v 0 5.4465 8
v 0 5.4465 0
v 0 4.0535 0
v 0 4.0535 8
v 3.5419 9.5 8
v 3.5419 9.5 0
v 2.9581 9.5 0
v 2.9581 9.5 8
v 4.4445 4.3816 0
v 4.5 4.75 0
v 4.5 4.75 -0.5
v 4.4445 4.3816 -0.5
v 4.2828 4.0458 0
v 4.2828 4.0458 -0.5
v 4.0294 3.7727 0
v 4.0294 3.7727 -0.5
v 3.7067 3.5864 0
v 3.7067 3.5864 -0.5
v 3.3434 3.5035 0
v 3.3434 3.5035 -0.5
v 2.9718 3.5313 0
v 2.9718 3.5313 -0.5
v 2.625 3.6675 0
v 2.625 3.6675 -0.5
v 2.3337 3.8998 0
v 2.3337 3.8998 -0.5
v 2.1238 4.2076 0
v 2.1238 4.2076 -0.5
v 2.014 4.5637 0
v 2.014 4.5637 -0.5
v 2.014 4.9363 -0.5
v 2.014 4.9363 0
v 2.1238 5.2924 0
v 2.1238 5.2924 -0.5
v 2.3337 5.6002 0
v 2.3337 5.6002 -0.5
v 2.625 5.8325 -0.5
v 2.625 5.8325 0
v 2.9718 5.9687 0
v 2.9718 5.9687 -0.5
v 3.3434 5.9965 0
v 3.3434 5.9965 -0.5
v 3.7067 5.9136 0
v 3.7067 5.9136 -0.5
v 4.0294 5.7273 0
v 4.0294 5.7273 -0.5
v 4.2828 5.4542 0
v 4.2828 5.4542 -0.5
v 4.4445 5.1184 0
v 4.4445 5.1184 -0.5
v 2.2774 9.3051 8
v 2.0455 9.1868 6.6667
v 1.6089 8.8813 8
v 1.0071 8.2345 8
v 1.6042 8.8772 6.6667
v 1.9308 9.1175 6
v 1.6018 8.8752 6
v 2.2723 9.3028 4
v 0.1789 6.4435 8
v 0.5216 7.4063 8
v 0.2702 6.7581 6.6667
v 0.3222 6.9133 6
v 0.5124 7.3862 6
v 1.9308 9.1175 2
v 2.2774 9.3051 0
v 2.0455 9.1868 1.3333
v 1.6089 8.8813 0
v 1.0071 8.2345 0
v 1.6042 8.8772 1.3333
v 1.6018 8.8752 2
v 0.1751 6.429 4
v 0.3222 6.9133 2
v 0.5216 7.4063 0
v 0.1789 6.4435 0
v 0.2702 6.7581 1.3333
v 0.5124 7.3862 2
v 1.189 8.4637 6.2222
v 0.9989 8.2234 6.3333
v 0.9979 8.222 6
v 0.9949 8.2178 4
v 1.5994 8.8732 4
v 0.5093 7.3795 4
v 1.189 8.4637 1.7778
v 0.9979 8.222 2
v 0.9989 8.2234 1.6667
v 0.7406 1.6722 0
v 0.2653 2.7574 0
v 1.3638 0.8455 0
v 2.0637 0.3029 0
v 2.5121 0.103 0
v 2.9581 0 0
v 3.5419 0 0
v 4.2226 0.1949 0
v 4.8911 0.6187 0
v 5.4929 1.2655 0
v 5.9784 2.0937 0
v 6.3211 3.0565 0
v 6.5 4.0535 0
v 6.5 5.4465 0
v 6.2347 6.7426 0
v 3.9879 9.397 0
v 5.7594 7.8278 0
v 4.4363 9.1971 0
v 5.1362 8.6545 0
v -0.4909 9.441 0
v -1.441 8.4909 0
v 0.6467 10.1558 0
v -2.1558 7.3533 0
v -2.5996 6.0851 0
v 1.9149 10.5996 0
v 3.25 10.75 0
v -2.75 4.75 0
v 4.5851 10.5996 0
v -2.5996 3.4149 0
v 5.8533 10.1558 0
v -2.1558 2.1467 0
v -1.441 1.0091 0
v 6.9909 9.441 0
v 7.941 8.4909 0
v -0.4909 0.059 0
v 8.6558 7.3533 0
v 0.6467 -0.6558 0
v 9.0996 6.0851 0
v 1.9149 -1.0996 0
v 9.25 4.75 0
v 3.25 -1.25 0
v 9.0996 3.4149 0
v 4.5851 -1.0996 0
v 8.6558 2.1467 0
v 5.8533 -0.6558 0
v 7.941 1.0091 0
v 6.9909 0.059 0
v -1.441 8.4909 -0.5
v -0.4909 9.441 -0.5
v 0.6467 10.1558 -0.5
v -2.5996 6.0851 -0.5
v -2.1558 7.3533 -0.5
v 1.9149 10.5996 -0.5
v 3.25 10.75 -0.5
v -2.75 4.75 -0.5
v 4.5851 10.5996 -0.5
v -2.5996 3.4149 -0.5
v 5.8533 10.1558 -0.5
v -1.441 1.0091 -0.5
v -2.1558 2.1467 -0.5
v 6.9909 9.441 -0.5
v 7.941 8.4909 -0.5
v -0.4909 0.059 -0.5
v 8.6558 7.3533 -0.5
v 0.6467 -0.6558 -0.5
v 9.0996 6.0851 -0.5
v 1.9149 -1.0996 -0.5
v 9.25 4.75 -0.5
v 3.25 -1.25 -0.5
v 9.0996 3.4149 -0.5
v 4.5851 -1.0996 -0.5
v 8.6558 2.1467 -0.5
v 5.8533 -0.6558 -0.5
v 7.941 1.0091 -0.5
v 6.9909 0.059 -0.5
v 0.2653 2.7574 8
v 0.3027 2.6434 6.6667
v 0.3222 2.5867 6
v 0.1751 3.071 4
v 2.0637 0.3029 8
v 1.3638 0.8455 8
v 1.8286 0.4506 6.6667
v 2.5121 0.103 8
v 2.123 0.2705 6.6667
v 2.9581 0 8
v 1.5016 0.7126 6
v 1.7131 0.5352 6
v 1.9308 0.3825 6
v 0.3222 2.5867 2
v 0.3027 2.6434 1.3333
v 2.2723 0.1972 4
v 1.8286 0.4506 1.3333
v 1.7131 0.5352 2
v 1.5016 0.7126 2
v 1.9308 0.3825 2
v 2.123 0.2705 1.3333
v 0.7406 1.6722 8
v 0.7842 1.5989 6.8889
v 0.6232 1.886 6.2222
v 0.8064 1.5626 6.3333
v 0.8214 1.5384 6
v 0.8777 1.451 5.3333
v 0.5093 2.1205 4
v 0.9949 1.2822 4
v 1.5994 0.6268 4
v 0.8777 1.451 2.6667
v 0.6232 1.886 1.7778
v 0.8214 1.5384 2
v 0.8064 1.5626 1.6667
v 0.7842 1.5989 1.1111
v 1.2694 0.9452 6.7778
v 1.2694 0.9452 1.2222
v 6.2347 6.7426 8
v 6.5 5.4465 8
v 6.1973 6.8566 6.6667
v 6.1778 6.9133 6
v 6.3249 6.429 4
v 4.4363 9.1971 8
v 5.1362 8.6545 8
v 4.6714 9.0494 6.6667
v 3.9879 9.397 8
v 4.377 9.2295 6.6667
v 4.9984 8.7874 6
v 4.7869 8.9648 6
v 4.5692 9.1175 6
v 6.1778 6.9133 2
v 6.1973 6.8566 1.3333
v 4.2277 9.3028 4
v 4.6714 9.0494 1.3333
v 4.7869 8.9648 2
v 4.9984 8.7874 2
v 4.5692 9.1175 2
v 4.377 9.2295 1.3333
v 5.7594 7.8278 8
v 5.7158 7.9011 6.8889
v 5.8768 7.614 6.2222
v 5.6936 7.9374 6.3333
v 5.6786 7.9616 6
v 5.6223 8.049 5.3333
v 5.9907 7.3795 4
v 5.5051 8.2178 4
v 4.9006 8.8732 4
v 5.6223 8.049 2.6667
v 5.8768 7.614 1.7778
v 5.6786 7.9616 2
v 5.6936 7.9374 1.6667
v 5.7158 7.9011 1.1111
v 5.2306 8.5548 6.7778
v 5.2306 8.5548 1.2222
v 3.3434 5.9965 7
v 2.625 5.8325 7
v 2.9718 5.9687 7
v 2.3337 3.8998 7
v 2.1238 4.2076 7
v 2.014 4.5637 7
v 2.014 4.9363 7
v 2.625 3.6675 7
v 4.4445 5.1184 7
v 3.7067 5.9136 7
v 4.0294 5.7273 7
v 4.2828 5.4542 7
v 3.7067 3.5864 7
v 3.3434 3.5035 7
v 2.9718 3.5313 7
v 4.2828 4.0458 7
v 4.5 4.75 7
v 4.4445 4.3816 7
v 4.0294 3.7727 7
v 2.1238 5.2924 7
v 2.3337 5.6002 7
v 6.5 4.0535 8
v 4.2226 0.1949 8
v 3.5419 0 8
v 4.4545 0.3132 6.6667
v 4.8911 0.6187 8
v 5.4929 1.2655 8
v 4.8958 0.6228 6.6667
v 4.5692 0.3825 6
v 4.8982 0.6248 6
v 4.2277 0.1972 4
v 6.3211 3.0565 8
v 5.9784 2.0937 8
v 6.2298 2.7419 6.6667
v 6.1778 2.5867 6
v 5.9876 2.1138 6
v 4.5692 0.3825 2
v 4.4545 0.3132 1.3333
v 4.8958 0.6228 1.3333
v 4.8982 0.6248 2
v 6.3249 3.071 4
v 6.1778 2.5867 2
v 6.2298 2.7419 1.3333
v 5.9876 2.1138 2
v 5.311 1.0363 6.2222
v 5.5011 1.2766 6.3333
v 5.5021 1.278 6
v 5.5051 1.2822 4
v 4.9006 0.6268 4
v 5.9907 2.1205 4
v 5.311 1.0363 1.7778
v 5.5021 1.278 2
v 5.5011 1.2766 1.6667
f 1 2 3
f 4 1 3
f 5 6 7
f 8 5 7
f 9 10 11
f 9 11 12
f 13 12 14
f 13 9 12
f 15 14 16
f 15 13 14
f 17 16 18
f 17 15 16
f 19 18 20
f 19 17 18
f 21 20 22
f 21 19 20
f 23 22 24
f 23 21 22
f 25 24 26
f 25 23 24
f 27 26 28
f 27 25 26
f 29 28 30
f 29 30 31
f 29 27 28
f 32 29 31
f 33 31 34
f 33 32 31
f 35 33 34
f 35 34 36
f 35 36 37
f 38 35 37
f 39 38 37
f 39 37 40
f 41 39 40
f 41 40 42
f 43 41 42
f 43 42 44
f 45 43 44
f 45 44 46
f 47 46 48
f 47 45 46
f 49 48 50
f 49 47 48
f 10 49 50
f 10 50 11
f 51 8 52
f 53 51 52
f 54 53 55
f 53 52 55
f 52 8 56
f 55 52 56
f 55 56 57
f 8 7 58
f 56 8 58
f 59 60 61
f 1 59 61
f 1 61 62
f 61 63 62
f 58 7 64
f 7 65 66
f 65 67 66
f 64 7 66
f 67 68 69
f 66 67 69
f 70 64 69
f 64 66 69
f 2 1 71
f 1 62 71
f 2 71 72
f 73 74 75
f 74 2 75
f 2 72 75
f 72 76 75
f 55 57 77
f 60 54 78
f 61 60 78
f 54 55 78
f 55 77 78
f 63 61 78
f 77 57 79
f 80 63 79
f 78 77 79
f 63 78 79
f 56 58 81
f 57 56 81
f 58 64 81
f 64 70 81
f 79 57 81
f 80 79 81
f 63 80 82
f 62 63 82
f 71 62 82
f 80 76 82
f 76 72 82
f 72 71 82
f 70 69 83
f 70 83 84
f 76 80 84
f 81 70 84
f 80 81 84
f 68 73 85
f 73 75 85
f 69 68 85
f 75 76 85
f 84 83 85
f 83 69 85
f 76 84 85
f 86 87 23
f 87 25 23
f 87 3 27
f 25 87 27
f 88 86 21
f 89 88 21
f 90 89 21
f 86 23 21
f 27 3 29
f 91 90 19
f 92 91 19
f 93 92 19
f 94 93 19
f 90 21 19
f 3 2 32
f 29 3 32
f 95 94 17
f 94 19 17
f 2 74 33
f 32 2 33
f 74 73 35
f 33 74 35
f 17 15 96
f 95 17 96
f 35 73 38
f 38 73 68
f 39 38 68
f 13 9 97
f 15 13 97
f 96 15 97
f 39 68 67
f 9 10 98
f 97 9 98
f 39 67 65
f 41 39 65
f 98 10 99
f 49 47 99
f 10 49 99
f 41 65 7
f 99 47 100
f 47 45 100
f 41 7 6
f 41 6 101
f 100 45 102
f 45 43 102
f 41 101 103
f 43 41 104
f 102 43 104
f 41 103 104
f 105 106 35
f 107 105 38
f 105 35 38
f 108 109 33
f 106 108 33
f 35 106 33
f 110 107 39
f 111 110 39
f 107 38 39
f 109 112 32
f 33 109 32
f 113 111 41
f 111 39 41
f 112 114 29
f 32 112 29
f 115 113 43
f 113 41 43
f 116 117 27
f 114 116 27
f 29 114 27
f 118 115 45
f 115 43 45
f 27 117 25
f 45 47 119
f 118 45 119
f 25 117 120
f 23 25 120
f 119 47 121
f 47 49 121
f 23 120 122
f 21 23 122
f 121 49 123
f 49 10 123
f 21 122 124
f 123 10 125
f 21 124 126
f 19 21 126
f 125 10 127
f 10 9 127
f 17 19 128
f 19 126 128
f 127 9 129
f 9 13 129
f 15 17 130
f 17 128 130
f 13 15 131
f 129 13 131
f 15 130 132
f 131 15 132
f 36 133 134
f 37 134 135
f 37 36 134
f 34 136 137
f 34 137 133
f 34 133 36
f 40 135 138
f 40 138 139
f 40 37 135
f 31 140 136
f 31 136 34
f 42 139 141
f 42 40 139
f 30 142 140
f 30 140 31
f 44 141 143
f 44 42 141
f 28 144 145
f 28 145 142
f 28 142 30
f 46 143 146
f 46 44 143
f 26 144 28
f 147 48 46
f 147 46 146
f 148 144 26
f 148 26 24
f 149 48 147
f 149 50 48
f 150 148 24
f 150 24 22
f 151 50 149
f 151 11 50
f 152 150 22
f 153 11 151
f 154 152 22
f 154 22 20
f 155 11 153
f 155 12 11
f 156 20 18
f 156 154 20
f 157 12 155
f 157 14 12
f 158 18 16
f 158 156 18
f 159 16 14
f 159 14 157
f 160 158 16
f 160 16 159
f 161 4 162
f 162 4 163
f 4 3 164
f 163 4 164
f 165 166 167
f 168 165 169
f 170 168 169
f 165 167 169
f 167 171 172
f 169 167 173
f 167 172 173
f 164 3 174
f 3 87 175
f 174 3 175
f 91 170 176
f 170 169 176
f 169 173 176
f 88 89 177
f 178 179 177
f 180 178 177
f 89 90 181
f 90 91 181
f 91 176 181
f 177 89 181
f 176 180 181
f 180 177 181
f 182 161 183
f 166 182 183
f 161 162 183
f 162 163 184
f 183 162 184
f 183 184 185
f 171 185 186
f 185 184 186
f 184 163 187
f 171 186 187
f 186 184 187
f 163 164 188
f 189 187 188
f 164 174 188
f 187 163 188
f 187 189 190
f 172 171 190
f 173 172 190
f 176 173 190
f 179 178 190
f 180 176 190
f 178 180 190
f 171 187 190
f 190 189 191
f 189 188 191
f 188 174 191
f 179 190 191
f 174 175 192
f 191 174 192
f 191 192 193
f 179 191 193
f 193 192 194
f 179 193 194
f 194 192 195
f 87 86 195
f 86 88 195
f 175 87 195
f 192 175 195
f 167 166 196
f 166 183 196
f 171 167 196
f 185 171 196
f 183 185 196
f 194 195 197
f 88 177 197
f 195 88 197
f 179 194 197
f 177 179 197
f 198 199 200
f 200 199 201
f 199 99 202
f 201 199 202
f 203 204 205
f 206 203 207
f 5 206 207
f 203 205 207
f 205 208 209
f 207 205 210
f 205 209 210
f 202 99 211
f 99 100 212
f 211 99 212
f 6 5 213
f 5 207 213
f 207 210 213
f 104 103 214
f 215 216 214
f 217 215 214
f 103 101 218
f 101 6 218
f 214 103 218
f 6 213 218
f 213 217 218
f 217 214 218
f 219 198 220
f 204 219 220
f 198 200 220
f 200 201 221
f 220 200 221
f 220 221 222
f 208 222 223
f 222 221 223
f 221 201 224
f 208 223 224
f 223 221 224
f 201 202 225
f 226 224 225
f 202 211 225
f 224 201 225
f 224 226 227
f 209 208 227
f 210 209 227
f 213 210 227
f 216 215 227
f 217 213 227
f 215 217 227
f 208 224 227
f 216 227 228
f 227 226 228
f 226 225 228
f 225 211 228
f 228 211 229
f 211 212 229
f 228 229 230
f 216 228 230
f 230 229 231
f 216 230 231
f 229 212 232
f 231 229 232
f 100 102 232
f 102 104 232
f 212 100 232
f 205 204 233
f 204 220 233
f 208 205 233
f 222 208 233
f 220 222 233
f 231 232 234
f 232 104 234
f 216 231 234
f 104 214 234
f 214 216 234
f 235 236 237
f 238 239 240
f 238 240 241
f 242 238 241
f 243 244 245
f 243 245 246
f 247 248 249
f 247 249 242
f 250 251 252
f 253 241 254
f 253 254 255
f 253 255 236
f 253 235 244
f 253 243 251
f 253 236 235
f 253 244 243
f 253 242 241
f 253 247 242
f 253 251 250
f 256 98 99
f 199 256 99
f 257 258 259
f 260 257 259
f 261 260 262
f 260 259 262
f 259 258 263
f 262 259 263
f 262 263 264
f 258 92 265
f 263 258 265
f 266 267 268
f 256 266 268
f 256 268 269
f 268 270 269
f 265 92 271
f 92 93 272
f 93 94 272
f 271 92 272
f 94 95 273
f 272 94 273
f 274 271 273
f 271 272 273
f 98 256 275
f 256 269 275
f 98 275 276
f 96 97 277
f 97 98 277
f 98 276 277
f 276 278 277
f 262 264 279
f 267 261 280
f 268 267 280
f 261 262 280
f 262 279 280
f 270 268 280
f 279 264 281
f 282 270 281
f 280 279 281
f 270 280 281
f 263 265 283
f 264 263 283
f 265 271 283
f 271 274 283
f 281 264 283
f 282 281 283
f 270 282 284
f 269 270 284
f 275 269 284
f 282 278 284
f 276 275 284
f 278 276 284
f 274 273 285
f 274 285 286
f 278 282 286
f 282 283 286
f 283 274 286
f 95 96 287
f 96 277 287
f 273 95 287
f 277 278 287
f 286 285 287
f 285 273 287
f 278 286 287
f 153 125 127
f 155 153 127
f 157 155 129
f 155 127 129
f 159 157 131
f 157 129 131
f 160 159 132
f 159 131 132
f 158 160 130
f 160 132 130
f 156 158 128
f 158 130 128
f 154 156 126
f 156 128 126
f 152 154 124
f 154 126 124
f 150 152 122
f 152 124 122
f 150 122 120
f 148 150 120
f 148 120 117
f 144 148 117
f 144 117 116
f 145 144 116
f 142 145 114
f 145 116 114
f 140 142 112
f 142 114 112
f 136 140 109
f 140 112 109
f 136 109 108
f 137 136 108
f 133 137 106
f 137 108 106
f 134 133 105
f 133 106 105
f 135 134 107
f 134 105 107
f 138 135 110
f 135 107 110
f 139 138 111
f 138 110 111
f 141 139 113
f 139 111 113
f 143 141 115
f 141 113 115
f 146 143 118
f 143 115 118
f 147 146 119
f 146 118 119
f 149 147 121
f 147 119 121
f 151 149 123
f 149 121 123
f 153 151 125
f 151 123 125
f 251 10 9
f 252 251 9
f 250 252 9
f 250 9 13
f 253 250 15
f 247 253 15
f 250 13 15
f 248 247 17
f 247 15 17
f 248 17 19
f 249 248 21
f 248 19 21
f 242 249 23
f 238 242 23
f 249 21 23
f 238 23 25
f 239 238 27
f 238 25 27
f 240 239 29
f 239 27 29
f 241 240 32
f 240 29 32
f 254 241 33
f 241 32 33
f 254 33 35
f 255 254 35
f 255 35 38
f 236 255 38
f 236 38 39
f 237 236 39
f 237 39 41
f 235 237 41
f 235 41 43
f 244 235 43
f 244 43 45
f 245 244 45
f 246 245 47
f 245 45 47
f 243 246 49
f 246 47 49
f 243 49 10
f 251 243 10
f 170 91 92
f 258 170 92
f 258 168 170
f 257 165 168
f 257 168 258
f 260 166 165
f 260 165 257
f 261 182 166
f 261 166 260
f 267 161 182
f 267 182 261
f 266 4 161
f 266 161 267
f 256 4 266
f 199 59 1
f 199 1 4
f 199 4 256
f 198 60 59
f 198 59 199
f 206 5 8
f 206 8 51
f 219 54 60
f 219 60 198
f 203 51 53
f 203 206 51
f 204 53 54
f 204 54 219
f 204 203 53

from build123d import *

# Parameters (mm, degrees)
F1_DEPTH = 8
F2_R     = 6
F2_R_2   = 1.25
F3_DEPTH = 0.5
F4_DEPTH = 7


with BuildPart() as f1:
    # F0 (on Top) → F1 (new body)
    with BuildSketch(Plane.XY):
        with BuildLine():
            add(Edge.make_bspline(
                [(0, 4.0535001257), (0.3782830439, 0.3340592761), (2.958103263, 0)],
                knots=[4.8589648787, 4.8589648787, 4.8589648787, 6.1942166845, 6.1942166845, 6.1942166845], degree=2, weights=[1, 0.7852937366, 1]))
            Line((2.958103263, 0), (3.541896737, 0))
            add(Edge.make_bspline(
                [(3.541896737, 0), (6.1217169561, 0.3340592761), (6.5, 4.0535001257)],
                knots=[0.0889686226, 0.0889686226, 0.0889686226, 1.4242204285, 1.4242204285, 1.4242204285], degree=2, weights=[1, 0.7852937366, 1]))
            Line((6.5, 4.0535001257), (6.5, 5.4464998743))
            add(Edge.make_bspline(
                [(6.5, 5.4464998743), (6.1217169561, 9.1659407239), (3.541896737, 9.5)],
                knots=[1.7173722251, 1.7173722251, 1.7173722251, 3.0526240309, 3.0526240309, 3.0526240309], degree=2, weights=[1, 0.7852937366, 1]))
            Line((3.541896737, 9.5), (2.958103263, 9.5))
            add(Edge.make_bspline(
                [(2.958103263, 9.5), (0.3782830439, 9.1659407239), (0, 5.4464998743)],
                knots=[3.2305612762, 3.2305612762, 3.2305612762, 4.5658130821, 4.5658130821, 4.5658130821], degree=2, weights=[1, 0.7852937366, 1]))
            Line((0, 5.4464998743), (0, 4.0535001257))
        make_face()
    extrude(amount=F1_DEPTH)

    # F2 (on face) → F4 (cut)
    with BuildSketch(Plane(origin=(0, 0, 0), x_dir=(1, 0, 0), z_dir=(0, 0, -1))):
        with Locations((3.25, -4.75)):
            Circle(F2_R_2)
    extrude(amount=-F4_DEPTH, mode=Mode.SUBTRACT)


with BuildPart() as f3:
    # F2 (on face) → F3 (new body)
    with BuildSketch(Plane(origin=(0, 0, 0), x_dir=(1, 0, 0), z_dir=(0, 0, -1))):
        with Locations((3.25, -4.75)):
            Circle(F2_R)
        with BuildLine():
            Line((0, -5.4464998743), (0, -4.0535001257))
            add(Edge.make_bspline(
                [(0, -4.0535001257), (0.3782830439, -0.3340592761), (2.958103263, 0)],
                knots=[4.8589648787, 4.8589648787, 4.8589648787, 6.1942166845, 6.1942166845, 6.1942166845], degree=2, weights=[1, 0.7852937366, 1]))
            Line((2.958103263, 0), (3.541896737, 0))
            add(Edge.make_bspline(
                [(3.541896737, 0), (6.1217169561, -0.3340592761), (6.5, -4.0535001257)],
                knots=[0.0889686226, 0.0889686226, 0.0889686226, 1.4242204285, 1.4242204285, 1.4242204285], degree=2, weights=[1, 0.7852937366, 1]))
            Line((6.5, -4.0535001257), (6.5, -5.4464998743))
            add(Edge.make_bspline(
                [(6.5, -5.4464998743), (6.1217169561, -9.1659407239), (3.541896737, -9.5)],
                knots=[1.7173722251, 1.7173722251, 1.7173722251, 3.0526240309, 3.0526240309, 3.0526240309], degree=2, weights=[1, 0.7852937366, 1]))
            Line((3.541896737, -9.5), (2.958103263, -9.5))
            add(Edge.make_bspline(
                [(2.958103263, -9.5), (0.3782830439, -9.1659407239), (0, -5.4464998743)],
                knots=[3.2305612762, 3.2305612762, 3.2305612762, 4.5658130821, 4.5658130821, 4.5658130821], degree=2, weights=[1, 0.7852937366, 1]))
        make_face(mode=Mode.SUBTRACT)
        with BuildLine():
            add(Edge.make_bspline(
                [(0, -4.0535001257), (0.3782830439, -0.3340592761), (2.958103263, 0)],
                knots=[4.8589648787, 4.8589648787, 4.8589648787, 6.1942166845, 6.1942166845, 6.1942166845], degree=2, weights=[1, 0.7852937366, 1]))
            Line((0, -4.0535001257), (0, -5.4464998743))
            add(Edge.make_bspline(
                [(2.958103263, -9.5), (0.3782830439, -9.1659407239), (0, -5.4464998743)],
                knots=[3.2305612762, 3.2305612762, 3.2305612762, 4.5658130821, 4.5658130821, 4.5658130821], degree=2, weights=[1, 0.7852937366, 1]))
            Line((2.958103263, -9.5), (3.541896737, -9.5))
            add(Edge.make_bspline(
                [(6.5, -5.4464998743), (6.1217169561, -9.1659407239), (3.541896737, -9.5)],
                knots=[1.7173722251, 1.7173722251, 1.7173722251, 3.0526240309, 3.0526240309, 3.0526240309], degree=2, weights=[1, 0.7852937366, 1]))
            Line((6.5, -5.4464998743), (6.5, -4.0535001257))
            add(Edge.make_bspline(
                [(3.541896737, 0), (6.1217169561, -0.3340592761), (6.5, -4.0535001257)],
                knots=[0.0889686226, 0.0889686226, 0.0889686226, 1.4242204285, 1.4242204285, 1.4242204285], degree=2, weights=[1, 0.7852937366, 1]))
            Line((3.541896737, 0), (2.958103263, 0))
        make_face()
        with Locations((3.25, -4.75)):
            Circle(F2_R_2, mode=Mode.SUBTRACT)
    extrude(amount=F3_DEPTH)


solid = Compound([f1.part, f3.part])
